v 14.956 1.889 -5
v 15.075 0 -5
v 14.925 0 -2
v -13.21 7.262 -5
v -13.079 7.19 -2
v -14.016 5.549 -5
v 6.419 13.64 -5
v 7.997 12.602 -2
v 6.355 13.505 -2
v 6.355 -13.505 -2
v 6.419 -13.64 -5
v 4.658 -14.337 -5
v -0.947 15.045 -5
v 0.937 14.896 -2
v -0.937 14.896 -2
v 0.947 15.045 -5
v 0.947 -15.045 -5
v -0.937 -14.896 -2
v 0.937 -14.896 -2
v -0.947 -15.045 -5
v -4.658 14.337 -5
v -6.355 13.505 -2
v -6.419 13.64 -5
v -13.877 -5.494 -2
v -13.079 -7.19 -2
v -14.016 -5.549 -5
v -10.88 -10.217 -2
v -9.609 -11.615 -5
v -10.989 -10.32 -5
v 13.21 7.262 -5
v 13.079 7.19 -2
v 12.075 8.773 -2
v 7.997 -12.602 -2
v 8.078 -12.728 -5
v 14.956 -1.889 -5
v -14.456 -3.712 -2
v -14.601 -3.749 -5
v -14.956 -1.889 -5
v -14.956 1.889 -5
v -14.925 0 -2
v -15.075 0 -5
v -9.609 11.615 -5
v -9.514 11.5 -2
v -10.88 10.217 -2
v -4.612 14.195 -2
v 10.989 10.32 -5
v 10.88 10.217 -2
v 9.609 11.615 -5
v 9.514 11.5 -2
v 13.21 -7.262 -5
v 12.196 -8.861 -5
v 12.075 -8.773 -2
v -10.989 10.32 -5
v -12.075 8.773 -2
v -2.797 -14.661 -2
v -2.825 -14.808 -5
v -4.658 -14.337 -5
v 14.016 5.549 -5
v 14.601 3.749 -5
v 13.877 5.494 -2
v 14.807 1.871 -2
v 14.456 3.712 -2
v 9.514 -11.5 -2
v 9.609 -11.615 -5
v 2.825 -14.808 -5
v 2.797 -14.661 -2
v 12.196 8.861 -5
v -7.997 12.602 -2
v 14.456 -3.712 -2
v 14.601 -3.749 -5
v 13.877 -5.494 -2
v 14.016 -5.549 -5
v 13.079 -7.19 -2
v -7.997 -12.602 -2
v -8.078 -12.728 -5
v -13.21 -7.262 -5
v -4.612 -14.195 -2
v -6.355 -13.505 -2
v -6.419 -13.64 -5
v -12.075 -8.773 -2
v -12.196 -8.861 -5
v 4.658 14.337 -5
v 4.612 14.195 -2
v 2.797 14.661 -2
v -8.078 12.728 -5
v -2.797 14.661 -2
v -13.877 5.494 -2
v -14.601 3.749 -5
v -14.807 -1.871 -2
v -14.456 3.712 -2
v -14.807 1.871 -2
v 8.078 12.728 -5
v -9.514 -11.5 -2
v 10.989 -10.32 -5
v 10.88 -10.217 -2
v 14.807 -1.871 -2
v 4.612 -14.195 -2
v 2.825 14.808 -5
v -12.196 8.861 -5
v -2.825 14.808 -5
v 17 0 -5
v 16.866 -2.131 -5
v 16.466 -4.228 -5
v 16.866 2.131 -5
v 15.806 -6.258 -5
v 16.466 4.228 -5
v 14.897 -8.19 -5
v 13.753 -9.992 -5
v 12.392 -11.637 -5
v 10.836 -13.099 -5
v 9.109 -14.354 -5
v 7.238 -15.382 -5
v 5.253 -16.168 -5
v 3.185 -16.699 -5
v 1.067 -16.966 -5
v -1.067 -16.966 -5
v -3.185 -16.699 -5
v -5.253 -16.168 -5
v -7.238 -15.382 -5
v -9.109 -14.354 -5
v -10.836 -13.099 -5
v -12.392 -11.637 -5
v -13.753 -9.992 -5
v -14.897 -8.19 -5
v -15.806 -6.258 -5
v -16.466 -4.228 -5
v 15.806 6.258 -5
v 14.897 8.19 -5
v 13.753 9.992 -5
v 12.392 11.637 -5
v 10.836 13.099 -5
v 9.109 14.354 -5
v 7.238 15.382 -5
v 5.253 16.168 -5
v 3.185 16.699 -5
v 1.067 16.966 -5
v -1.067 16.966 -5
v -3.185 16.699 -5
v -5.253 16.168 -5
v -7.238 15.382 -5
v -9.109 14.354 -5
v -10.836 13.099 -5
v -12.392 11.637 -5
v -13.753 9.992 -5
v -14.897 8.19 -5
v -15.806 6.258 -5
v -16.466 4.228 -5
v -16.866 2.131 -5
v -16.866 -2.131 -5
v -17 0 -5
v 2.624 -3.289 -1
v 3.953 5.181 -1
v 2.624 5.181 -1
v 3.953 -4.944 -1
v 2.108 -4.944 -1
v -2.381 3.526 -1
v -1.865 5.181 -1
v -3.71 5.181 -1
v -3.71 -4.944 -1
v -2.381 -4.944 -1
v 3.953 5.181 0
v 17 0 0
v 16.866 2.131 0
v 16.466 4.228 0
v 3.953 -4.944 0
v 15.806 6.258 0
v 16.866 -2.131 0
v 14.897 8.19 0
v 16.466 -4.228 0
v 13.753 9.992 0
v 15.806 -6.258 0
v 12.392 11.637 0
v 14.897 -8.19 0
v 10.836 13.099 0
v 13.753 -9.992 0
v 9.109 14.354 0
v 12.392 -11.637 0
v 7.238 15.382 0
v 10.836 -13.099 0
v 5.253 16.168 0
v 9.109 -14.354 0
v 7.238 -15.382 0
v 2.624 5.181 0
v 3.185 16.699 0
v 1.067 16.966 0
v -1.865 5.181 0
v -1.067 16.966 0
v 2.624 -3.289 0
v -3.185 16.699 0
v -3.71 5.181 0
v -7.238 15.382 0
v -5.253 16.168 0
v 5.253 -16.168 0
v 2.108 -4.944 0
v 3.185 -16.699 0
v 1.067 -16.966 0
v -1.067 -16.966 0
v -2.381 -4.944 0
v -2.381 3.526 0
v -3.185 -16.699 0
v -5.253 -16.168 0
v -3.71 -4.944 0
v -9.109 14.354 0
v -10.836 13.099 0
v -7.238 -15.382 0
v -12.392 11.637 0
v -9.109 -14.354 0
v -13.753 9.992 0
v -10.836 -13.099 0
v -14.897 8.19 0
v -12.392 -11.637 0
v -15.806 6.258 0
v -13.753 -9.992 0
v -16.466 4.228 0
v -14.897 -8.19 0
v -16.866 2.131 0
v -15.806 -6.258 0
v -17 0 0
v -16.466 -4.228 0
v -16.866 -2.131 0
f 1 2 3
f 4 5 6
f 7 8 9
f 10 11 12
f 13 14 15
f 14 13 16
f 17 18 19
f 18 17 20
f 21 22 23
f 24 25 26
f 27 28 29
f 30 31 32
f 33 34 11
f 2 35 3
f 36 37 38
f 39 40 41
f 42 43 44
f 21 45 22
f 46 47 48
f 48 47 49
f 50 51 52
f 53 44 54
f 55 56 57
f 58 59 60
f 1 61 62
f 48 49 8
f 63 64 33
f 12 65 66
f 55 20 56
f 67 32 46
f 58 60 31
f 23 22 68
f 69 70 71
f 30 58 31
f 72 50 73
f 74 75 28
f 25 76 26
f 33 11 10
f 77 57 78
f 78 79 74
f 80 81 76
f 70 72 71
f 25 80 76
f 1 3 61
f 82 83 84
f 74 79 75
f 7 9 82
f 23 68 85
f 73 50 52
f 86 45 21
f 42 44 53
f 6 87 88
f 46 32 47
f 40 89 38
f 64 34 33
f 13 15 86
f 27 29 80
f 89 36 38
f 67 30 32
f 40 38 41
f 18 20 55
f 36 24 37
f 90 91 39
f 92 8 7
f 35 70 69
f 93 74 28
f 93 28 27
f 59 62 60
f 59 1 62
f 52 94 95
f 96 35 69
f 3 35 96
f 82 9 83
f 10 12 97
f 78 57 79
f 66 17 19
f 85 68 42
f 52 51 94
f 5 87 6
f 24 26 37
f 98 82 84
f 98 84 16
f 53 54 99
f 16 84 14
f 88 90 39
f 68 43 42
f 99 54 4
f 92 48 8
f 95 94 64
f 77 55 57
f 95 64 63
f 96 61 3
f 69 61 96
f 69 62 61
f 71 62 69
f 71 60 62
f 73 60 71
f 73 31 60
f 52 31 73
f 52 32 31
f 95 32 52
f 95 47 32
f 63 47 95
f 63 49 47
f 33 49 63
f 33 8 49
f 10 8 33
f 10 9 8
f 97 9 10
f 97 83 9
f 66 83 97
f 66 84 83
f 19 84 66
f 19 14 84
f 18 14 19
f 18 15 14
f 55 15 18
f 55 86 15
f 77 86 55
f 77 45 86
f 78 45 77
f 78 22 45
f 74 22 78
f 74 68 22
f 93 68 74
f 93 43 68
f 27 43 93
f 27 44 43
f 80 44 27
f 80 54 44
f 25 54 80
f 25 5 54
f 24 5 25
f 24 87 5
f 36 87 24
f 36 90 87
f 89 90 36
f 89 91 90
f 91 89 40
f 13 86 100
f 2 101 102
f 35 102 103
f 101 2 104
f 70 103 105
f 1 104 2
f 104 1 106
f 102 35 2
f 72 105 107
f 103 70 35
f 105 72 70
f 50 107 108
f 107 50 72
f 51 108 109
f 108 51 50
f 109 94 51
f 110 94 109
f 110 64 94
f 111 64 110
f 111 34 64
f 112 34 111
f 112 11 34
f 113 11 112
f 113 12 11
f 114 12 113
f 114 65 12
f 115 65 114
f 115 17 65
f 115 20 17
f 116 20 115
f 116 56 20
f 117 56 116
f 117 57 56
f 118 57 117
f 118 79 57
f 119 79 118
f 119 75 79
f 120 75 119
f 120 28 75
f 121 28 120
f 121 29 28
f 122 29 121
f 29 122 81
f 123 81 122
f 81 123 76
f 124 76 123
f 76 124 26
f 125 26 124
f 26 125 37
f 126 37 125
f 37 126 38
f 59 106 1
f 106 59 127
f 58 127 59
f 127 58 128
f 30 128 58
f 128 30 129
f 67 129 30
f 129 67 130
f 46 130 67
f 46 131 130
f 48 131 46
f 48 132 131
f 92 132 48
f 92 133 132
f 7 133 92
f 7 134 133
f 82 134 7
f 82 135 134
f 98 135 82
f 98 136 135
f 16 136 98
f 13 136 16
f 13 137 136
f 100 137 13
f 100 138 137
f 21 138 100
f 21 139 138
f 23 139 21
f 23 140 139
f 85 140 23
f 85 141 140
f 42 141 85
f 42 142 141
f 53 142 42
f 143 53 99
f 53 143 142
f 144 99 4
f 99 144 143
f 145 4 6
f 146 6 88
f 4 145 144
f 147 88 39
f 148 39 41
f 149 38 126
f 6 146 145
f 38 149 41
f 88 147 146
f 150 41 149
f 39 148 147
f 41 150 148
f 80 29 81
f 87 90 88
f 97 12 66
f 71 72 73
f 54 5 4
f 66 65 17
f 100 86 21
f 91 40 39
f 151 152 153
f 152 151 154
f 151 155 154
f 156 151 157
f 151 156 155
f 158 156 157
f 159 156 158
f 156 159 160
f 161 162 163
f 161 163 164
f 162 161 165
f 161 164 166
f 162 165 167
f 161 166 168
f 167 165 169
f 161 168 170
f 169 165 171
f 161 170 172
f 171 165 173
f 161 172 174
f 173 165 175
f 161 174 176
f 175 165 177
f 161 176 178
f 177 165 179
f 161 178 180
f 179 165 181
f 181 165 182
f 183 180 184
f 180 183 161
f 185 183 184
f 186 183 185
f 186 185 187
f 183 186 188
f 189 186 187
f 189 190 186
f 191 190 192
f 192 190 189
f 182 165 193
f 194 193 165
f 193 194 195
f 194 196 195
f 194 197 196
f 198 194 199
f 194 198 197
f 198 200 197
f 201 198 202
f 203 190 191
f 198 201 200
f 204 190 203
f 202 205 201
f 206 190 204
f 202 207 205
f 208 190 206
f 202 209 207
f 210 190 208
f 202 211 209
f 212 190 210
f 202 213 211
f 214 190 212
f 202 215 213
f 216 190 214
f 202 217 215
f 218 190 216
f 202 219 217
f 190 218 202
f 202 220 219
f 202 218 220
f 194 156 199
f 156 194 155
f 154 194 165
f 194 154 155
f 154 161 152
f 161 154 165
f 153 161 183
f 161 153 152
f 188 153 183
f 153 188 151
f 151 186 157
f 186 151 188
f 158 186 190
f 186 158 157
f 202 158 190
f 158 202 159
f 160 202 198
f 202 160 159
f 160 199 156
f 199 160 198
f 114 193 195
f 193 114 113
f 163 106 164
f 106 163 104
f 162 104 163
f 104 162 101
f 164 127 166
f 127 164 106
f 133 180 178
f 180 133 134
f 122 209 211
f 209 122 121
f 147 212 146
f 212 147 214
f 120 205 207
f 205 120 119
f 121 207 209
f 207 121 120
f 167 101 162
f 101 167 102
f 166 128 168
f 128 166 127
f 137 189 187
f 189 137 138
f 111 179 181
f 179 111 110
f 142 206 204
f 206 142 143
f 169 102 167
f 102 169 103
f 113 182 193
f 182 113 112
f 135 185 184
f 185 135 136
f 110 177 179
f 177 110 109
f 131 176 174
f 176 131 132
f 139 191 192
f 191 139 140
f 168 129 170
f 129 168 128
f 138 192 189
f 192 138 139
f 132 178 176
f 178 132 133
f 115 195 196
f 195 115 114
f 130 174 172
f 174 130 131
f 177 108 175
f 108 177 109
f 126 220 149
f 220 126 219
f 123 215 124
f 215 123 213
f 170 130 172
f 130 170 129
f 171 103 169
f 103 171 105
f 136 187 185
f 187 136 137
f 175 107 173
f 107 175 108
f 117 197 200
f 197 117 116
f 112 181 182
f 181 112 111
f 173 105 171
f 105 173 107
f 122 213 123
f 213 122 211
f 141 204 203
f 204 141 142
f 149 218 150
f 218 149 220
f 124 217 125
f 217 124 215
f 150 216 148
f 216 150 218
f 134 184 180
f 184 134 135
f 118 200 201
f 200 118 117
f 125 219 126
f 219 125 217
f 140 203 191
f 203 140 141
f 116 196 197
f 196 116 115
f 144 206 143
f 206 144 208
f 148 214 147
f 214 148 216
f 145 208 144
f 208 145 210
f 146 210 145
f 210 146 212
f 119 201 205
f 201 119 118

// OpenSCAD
$fn = 50;


difference() {
	union() {
		translate(v = [0, 0, -5.0000000000]) {
			cylinder(h = 5, r = 17.0000000000);
		}
	}
	union() {
		#translate(v = [0, 0, -5.0000000000]) {
			cylinder(h = 3, r1 = 15.0750000000, r2 = 14.9250000000);
		}
		translate(v = [0, 0, -1]) {
			linear_extrude(height = 1) {
				text(font = "Impact", halign = "center", size = 10, text = "N", valign = "center");
			}
		}
	}
}
